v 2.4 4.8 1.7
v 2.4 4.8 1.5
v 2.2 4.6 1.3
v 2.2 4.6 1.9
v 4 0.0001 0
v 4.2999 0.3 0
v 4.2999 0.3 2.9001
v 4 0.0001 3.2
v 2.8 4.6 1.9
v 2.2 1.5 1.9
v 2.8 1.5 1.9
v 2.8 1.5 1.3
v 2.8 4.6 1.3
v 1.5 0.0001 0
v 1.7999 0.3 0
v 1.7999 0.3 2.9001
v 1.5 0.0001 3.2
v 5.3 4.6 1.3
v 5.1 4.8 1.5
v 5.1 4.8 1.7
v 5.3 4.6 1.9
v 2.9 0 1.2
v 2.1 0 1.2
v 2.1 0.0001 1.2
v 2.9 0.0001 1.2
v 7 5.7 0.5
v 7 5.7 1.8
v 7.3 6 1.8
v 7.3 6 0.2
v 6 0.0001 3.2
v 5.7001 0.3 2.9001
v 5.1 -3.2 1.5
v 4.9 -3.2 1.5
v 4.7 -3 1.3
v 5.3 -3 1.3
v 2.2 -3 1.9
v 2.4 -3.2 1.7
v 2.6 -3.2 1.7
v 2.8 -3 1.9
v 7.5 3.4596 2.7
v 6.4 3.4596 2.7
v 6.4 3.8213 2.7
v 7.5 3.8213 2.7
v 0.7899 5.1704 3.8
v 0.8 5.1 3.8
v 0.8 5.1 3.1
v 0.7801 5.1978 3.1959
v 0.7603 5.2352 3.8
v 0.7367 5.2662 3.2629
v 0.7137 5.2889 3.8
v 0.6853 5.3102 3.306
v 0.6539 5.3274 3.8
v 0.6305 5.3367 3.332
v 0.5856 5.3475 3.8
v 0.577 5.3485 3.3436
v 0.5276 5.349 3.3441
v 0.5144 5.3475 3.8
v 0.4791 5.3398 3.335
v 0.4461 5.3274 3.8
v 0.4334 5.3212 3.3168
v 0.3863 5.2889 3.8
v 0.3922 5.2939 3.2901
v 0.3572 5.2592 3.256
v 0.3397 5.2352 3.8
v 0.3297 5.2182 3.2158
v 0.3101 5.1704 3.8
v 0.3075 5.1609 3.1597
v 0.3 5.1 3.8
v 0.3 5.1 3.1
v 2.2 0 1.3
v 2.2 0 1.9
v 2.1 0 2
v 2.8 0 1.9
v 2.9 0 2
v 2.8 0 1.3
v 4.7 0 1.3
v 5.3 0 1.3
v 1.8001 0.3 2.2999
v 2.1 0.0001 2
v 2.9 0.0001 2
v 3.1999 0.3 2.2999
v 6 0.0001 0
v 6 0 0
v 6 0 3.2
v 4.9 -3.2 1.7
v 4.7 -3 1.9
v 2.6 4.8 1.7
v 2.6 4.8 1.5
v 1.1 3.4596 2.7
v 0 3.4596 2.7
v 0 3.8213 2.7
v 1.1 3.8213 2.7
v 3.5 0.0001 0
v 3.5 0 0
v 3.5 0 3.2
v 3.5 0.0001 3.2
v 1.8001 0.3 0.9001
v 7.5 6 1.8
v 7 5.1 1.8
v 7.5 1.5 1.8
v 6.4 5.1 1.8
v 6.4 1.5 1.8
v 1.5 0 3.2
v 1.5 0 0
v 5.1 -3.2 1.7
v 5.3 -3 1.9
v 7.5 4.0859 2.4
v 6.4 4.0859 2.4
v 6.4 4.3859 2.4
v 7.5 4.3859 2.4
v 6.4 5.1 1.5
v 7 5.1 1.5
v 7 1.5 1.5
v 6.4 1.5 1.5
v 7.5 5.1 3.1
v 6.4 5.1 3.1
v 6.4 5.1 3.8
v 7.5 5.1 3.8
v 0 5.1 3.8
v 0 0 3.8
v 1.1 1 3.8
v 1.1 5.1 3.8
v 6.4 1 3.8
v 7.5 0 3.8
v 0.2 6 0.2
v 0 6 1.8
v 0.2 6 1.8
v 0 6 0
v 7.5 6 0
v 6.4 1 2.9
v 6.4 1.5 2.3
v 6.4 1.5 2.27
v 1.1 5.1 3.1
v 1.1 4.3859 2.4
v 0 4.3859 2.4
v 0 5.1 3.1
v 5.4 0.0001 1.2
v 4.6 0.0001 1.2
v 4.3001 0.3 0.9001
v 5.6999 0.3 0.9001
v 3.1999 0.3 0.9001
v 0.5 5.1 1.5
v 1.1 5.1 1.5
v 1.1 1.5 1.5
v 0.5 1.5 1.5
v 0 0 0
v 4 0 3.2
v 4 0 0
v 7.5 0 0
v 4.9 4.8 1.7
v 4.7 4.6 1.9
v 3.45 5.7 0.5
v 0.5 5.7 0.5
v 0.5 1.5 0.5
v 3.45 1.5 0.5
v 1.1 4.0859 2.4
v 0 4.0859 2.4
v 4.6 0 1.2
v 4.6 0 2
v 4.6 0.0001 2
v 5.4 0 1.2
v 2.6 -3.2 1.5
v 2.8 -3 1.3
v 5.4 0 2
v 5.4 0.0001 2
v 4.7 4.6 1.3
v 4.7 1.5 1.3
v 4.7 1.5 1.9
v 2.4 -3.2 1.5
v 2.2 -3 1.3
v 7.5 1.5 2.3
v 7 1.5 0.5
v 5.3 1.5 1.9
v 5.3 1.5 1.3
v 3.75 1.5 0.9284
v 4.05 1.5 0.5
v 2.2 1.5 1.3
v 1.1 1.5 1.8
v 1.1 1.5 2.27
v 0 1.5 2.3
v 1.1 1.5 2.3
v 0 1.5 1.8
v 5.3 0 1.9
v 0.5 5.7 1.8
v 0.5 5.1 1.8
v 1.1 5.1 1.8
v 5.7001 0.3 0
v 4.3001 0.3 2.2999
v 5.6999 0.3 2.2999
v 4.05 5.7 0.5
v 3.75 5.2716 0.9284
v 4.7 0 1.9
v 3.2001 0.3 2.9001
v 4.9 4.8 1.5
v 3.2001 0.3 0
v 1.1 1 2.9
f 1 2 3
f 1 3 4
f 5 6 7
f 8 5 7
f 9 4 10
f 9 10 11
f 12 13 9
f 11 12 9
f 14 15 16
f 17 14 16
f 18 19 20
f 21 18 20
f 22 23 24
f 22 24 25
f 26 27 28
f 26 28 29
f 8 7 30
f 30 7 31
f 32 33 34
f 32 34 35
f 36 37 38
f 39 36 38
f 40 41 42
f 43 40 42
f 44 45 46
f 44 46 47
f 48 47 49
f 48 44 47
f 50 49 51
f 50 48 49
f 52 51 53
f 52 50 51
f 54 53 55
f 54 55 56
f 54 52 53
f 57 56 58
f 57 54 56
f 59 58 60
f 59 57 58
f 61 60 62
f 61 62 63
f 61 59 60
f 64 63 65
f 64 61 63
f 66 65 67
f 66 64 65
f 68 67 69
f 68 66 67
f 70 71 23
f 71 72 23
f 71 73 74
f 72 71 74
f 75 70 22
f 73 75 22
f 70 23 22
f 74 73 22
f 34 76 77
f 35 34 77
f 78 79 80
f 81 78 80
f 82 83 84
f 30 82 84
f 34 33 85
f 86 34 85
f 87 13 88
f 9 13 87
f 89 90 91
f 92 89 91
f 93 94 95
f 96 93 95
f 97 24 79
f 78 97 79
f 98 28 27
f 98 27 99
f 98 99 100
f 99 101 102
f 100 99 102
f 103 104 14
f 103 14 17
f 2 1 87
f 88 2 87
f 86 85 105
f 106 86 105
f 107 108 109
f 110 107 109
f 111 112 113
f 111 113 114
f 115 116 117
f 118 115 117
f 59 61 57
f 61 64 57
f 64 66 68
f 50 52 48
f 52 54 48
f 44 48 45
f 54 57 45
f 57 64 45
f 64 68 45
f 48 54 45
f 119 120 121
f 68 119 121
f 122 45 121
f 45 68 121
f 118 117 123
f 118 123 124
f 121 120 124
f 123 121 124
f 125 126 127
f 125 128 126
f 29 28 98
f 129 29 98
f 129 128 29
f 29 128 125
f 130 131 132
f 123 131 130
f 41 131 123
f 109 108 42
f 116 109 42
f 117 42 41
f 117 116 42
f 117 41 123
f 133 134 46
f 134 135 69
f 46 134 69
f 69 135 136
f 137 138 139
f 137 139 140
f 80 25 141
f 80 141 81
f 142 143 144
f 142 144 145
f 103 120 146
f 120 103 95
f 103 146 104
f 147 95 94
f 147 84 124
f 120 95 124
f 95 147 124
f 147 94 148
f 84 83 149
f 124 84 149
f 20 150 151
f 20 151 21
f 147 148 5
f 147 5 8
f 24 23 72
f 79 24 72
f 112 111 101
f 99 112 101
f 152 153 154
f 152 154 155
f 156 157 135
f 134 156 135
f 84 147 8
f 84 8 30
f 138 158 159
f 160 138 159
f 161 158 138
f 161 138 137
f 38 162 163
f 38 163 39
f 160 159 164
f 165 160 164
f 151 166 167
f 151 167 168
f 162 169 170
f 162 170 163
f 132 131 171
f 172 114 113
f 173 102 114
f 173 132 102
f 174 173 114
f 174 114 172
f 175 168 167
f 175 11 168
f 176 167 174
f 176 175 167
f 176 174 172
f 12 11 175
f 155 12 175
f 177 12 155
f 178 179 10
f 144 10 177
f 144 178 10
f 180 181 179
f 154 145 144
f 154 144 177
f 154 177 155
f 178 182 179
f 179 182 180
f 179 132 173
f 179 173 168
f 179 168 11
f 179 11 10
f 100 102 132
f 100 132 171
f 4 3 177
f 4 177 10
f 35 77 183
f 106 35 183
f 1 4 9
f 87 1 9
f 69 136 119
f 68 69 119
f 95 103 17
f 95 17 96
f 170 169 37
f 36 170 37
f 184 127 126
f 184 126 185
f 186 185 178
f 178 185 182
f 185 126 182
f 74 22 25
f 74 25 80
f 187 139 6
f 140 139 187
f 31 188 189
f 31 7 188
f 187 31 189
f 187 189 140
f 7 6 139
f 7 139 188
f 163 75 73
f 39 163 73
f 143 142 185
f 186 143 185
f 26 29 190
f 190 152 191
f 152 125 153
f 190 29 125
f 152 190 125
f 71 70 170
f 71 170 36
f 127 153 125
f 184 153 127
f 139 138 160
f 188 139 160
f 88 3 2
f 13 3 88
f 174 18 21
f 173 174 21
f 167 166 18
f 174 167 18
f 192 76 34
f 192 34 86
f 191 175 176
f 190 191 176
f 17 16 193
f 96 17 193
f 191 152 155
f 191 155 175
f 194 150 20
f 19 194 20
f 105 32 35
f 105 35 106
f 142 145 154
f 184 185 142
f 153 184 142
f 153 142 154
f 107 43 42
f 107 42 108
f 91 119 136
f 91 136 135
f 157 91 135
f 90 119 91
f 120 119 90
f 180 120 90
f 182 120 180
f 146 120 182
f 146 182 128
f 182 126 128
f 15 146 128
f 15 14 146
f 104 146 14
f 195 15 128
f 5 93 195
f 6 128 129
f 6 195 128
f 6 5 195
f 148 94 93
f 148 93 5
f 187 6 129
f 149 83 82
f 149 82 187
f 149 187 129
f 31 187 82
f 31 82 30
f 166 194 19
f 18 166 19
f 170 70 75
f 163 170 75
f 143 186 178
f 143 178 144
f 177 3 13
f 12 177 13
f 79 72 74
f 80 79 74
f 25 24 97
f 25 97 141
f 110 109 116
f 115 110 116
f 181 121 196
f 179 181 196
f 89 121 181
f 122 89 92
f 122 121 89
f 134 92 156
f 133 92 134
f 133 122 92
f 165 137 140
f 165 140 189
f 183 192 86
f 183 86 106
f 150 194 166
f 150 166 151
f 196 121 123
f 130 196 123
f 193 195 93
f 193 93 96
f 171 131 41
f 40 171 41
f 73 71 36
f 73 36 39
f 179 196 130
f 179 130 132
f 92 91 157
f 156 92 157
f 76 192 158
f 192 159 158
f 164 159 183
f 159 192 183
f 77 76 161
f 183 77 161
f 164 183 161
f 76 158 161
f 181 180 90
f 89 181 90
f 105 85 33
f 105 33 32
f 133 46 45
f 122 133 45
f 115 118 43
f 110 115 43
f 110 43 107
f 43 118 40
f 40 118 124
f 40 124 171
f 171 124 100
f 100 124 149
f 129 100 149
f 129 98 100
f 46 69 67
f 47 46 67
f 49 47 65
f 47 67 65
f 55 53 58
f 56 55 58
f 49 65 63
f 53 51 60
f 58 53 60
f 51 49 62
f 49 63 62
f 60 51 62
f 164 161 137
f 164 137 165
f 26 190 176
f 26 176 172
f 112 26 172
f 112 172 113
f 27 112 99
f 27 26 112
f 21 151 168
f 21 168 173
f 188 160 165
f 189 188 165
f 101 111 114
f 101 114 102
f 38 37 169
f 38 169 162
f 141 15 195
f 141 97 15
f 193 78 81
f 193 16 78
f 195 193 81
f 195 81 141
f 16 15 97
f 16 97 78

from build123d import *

# Parameters (mm, degrees)
SKETCH_1_W                         = 7.5
SKETCH_1_H                         = 3.8
EXTRUDE_1_DEPTH                    = 6
CUT_EXTRUDE_1_DEPTH                = 5
CUT_EXTRUDE_2_DEPTH                = 11.329085148
EXTRUDE_2_REACH                    = 12.329
CUT_EXTRUDE_3_REACH                = 12.329
SKETCH_5_W                         = 5.3
SKETCH_5_H                         = 4.1
EXTRUDE_3_REACH                    = 11.972
EXTRUDE_5_REACH                    = 12.329
SKETCH_11_W                        = 2
SKETCH_11_H                        = 3.2
SKETCH_11_W_2                      = 0.8
SKETCH_11_H_2                      = 0.8
CUT_EXTRUDE_5_DEPTH                = 0.3
SKETCH_15_R                        = 0.05
CUT_EXTRUDE_6_DEPTH                = 0.1
CHAMFER_7_SIZE                     = 0.3
EXTRUDE_START                      = -4.8
SKETCH_7_W                         = 0.6
SKETCH_7_H                         = 0.6
EXTRUDE_4_DEPTH                    = 8
CHAMFER_6_SIZE                     = 0.2
PATTERN_LINEAR_1_COUNT             = 2
PATTERN_LINEAR_1_PITCH             = 2.5
CHAMFER_7_OF_PATTERN_LINEAR_1_SIZE = 0.3
CHAMFER_6_OF_PATTERN_LINEAR_1_SIZE = 0.2
CUT_EXTRUDE_4_REACH                = 11.972
CHAMFER_5_SIZE                     = 0.3


with BuildPart() as part:
    # Эскиз1 → Бобышка-Вытянуть1 (new body)
    with BuildSketch(Plane(origin=(0, 0, 0), x_dir=(1, 0, 0), z_dir=(0, 1, 0))):
        with Locations((3.75, -1.9)):
            Rectangle(SKETCH_1_W, SKETCH_1_H)
    extrude(amount=EXTRUDE_1_DEPTH)

    # Эскиз2 → Вырез-Вытянуть1 (cut)
    with BuildSketch(Plane(origin=(0, 6, 0), x_dir=(1, 0, 0), z_dir=(0, 1, 0))):
        Polygon((0.5, -0.5), (7, -0.5), (7, -1.5), (6.4, -1.5), (6.4, -3.3), (1.1, -3.3), (1.1, -1.5), (0.5, -1.5), align=None)
    extrude(amount=-CUT_EXTRUDE_1_DEPTH, mode=Mode.SUBTRACT)

    # Эскиз3 → Вырез-Вытянуть2 (cut, through all)
    with BuildSketch(Plane.ZY):
        Polygon((1.8, 6), (1.8, 1.5), (2.3, 1.5), (2.7, 3.459591794), (2.7, 3.821282026), (2.4, 4.085857157), (2.4, 4.385857157), (3.1, 5.1), (3.8, 5.1), (3.8, 6), align=None)
    extrude(amount=-CUT_EXTRUDE_2_DEPTH, mode=Mode.SUBTRACT)

    # Бобышка-Вытянуть2: up to this plane
    extrude_2_end = Plane(origin=(7.5, 5.1, 3.1), z_dir=(0, -0.6999999999999996, 0.7141428428542854))
    # Эскиз4 → Бобышка-Вытянуть2 (add, up to the surface)
    with BuildSketch(Plane.XY.offset(3.8), mode=Mode.PRIVATE) as extrude_2_sk1:
        with BuildLine():
            Line((0.3, 5.1), (0.8, 5.1))
            ThreePointArc((0.8, 5.1), (0.55, 5.35), (0.3, 5.1))
        make_face()
    extrude_2_tool1 = split(extrude(extrude_2_sk1.sketch, amount=-EXTRUDE_2_REACH, mode=Mode.PRIVATE), bisect_by=extrude_2_end, keep=Keep.BOTH, mode=Mode.PRIVATE)
    add(extrude_2_tool1.solids().sort_by_distance((0.55, 5.206103, 3.8))[0])

    # Эскиз5 → Вырез-Вытянуть3 (cut, up to next)
    with BuildSketch(Plane.XY.offset(3.8), mode=Mode.PRIVATE) as cut_extrude_3_sk1:
        with Locations((3.75, 3.05)):
            Rectangle(SKETCH_5_W, SKETCH_5_H)
    cut_extrude_3_tool1 = extrude(cut_extrude_3_sk1.sketch, amount=-CUT_EXTRUDE_3_REACH, mode=Mode.PRIVATE) & part.part
    add(cut_extrude_3_tool1.solids().sort_by_distance((3.75, 3.05, 3.8))[0], mode=Mode.SUBTRACT)

    # Эскиз6 → Бобышка-Вытянуть3 (add, up to next)
    with BuildSketch(Plane(origin=(0.5, 0, 0), x_dir=(0, 0, -1), z_dir=(1, 0, 0)), mode=Mode.PRIVATE) as extrude_3_sk1:
        Polygon((-2.9, 1), (-2.27, 1.5), (-0.5, 1.5), (-0.5, 1), align=None)
    extrude_3_tool1 = extrude(extrude_3_sk1.sketch, amount=EXTRUDE_3_REACH, mode=Mode.PRIVATE) - part.part
    add(extrude_3_tool1.solids().sort_by_distance((0.5, 1.23741, 1.550432))[0])

    # Эскиз9 → Бобышка-Вытянуть5 (add, up to next)
    with BuildSketch(Plane(origin=(0, 6, 0), x_dir=(1, 0, 0), z_dir=(0, 1, 0)), mode=Mode.PRIVATE) as extrude_5_sk1:
        Polygon((3.45, -0.5), (3.75, -0.928444402), (4.05, -0.5), align=None)
    extrude_5_tool1 = extrude(extrude_5_sk1.sketch, amount=-EXTRUDE_5_REACH, mode=Mode.PRIVATE) - part.part
    add(extrude_5_tool1.solids().sort_by_distance((3.75, 6, 0.642815))[0])

    # Эскиз11 → Вырез-Вытянуть5 (cut)
    with BuildSketch(Plane.XZ):
        with Locations((2.5, 1.6)):
            Rectangle(SKETCH_11_W, SKETCH_11_H)
        with Locations((2.5, 1.6)):
            Rectangle(SKETCH_11_W_2, SKETCH_11_H_2, mode=Mode.SUBTRACT)
    cut_extrude_5 = extrude(amount=-CUT_EXTRUDE_5_DEPTH, mode=Mode.SUBTRACT)

    # Эскиз15 → Вырез-Вытянуть6 (cut)
    with BuildSketch(Plane.XZ):
        with Locations(Location((2.5, 1.6, 0), (0, 0, 270))):
            Circle(SKETCH_15_R)
    extrude(amount=-CUT_EXTRUDE_6_DEPTH, mode=Mode.SUBTRACT)

    # Фаска7
    chamfer_7_edges = [part.edges().sort_by_distance(p)[0] for p in [
        (1.5, 0.3, 1.6),
        (2.5, 0.3, 3.2),
        (3.5, 0.3, 1.6),
        (2.9, 0.3, 1.6),
        (2.5, 0.3, 2),
        (2.1, 0.3, 1.6),
        (2.5, 0.3, 1.2),
    ]]
    chamfer(chamfer_7_edges, length=CHAMFER_7_SIZE - 0.0001)  # a hair under: the kernel refuses the full size

    # Эскиз7 → Бобышка-Вытянуть4 (add)
    with BuildSketch(Plane.XZ.offset(EXTRUDE_START)):
        with Locations((2.5, 1.6)):
            Rectangle(SKETCH_7_W, SKETCH_7_H)
    extrude_4 = extrude(amount=EXTRUDE_4_DEPTH)

    # Фаска6
    chamfer_6_edges = [part.edges().sort_by_distance(p)[0] for p in [
        (2.8, 4.8, 1.6),
        (2.5, 4.8, 1.9),
        (2.2, 4.8, 1.6),
        (2.5, 4.8, 1.3),
        (2.8, -3.2, 1.6),
        (2.5, -3.2, 1.9),
        (2.2, -3.2, 1.6),
        (2.5, -3.2, 1.3),
    ]]
    chamfer(chamfer_6_edges, length=CHAMFER_6_SIZE)

    # Линейный массив1: Вырез-Вытянуть5, Бобышка-Вытянуть4 ×2
    with Locations(*[(i * PATTERN_LINEAR_1_PITCH, 0, 0) for i in range(1, PATTERN_LINEAR_1_COUNT)]):
        add(cut_extrude_5, mode=Mode.SUBTRACT)
        add(extrude_4)

    # Фаска7 of Линейный массив1
    chamfer_7_of_pattern_linear_1_edges = [part.edges().sort_by_distance(p)[0] for p in [
        (4, 0.3, 1.6),
        (5, 0.3, 3.2),
        (6, 0.3, 1.6),
        (5.4, 0.3, 1.6),
        (5, 0.3, 2),
        (4.6, 0.3, 1.6),
        (5, 0.3, 1.2),
    ]]
    chamfer(chamfer_7_of_pattern_linear_1_edges, length=CHAMFER_7_OF_PATTERN_LINEAR_1_SIZE - 0.0001)  # a hair under: the kernel refuses the full size

    # Фаска6 of Линейный массив1
    chamfer_6_of_pattern_linear_1_edges = [part.edges().sort_by_distance(p)[0] for p in [
        (5.3, 4.8, 1.6),
        (5, 4.8, 1.9),
        (4.7, 4.8, 1.6),
        (5, 4.8, 1.3),
        (5.3, -3.2, 1.6),
        (5, -3.2, 1.9),
        (4.7, -3.2, 1.6),
        (5, -3.2, 1.3),
    ]]
    chamfer(chamfer_6_of_pattern_linear_1_edges, length=CHAMFER_6_OF_PATTERN_LINEAR_1_SIZE)

    # Вырез-Вытянуть4: up to this face of the body (flat: up to its plane)
    cut_extrude_4_end = Plane(part.part.faces().sort_by_distance((7, 3.75, 1))[0])
    # Эскиз10 → Вырез-Вытянуть4 (cut, up to the picked face)
    with BuildSketch(Plane(origin=(0.5, 0, 0), x_dir=(0, 0, -1), z_dir=(1, 0, 0)), mode=Mode.PRIVATE) as cut_extrude_4_sk1:
        Polygon((-1, 6), (-0.2, 6), (-1, 5.2), (-1, 5.1), (-1.8, 5.1), (-1.8, 6), align=None)
    cut_extrude_4_tool1 = split(extrude(cut_extrude_4_sk1.sketch, amount=CUT_EXTRUDE_4_REACH, mode=Mode.PRIVATE), bisect_by=cut_extrude_4_end, keep=Keep.BOTH, mode=Mode.PRIVATE)
    add(cut_extrude_4_tool1.solids().sort_by(Axis((0.5, 5.60641, 1.194872), (1, 0, 0)))[0], mode=Mode.SUBTRACT)

    # Фаска5
    chamfer_5_edges = [part.edges().sort_by_distance(p)[0] for p in [
        (7, 6, 1),
        (0.5, 6, 1),
    ]]
    chamfer(chamfer_5_edges, length=CHAMFER_5_SIZE)


solid = part.part
